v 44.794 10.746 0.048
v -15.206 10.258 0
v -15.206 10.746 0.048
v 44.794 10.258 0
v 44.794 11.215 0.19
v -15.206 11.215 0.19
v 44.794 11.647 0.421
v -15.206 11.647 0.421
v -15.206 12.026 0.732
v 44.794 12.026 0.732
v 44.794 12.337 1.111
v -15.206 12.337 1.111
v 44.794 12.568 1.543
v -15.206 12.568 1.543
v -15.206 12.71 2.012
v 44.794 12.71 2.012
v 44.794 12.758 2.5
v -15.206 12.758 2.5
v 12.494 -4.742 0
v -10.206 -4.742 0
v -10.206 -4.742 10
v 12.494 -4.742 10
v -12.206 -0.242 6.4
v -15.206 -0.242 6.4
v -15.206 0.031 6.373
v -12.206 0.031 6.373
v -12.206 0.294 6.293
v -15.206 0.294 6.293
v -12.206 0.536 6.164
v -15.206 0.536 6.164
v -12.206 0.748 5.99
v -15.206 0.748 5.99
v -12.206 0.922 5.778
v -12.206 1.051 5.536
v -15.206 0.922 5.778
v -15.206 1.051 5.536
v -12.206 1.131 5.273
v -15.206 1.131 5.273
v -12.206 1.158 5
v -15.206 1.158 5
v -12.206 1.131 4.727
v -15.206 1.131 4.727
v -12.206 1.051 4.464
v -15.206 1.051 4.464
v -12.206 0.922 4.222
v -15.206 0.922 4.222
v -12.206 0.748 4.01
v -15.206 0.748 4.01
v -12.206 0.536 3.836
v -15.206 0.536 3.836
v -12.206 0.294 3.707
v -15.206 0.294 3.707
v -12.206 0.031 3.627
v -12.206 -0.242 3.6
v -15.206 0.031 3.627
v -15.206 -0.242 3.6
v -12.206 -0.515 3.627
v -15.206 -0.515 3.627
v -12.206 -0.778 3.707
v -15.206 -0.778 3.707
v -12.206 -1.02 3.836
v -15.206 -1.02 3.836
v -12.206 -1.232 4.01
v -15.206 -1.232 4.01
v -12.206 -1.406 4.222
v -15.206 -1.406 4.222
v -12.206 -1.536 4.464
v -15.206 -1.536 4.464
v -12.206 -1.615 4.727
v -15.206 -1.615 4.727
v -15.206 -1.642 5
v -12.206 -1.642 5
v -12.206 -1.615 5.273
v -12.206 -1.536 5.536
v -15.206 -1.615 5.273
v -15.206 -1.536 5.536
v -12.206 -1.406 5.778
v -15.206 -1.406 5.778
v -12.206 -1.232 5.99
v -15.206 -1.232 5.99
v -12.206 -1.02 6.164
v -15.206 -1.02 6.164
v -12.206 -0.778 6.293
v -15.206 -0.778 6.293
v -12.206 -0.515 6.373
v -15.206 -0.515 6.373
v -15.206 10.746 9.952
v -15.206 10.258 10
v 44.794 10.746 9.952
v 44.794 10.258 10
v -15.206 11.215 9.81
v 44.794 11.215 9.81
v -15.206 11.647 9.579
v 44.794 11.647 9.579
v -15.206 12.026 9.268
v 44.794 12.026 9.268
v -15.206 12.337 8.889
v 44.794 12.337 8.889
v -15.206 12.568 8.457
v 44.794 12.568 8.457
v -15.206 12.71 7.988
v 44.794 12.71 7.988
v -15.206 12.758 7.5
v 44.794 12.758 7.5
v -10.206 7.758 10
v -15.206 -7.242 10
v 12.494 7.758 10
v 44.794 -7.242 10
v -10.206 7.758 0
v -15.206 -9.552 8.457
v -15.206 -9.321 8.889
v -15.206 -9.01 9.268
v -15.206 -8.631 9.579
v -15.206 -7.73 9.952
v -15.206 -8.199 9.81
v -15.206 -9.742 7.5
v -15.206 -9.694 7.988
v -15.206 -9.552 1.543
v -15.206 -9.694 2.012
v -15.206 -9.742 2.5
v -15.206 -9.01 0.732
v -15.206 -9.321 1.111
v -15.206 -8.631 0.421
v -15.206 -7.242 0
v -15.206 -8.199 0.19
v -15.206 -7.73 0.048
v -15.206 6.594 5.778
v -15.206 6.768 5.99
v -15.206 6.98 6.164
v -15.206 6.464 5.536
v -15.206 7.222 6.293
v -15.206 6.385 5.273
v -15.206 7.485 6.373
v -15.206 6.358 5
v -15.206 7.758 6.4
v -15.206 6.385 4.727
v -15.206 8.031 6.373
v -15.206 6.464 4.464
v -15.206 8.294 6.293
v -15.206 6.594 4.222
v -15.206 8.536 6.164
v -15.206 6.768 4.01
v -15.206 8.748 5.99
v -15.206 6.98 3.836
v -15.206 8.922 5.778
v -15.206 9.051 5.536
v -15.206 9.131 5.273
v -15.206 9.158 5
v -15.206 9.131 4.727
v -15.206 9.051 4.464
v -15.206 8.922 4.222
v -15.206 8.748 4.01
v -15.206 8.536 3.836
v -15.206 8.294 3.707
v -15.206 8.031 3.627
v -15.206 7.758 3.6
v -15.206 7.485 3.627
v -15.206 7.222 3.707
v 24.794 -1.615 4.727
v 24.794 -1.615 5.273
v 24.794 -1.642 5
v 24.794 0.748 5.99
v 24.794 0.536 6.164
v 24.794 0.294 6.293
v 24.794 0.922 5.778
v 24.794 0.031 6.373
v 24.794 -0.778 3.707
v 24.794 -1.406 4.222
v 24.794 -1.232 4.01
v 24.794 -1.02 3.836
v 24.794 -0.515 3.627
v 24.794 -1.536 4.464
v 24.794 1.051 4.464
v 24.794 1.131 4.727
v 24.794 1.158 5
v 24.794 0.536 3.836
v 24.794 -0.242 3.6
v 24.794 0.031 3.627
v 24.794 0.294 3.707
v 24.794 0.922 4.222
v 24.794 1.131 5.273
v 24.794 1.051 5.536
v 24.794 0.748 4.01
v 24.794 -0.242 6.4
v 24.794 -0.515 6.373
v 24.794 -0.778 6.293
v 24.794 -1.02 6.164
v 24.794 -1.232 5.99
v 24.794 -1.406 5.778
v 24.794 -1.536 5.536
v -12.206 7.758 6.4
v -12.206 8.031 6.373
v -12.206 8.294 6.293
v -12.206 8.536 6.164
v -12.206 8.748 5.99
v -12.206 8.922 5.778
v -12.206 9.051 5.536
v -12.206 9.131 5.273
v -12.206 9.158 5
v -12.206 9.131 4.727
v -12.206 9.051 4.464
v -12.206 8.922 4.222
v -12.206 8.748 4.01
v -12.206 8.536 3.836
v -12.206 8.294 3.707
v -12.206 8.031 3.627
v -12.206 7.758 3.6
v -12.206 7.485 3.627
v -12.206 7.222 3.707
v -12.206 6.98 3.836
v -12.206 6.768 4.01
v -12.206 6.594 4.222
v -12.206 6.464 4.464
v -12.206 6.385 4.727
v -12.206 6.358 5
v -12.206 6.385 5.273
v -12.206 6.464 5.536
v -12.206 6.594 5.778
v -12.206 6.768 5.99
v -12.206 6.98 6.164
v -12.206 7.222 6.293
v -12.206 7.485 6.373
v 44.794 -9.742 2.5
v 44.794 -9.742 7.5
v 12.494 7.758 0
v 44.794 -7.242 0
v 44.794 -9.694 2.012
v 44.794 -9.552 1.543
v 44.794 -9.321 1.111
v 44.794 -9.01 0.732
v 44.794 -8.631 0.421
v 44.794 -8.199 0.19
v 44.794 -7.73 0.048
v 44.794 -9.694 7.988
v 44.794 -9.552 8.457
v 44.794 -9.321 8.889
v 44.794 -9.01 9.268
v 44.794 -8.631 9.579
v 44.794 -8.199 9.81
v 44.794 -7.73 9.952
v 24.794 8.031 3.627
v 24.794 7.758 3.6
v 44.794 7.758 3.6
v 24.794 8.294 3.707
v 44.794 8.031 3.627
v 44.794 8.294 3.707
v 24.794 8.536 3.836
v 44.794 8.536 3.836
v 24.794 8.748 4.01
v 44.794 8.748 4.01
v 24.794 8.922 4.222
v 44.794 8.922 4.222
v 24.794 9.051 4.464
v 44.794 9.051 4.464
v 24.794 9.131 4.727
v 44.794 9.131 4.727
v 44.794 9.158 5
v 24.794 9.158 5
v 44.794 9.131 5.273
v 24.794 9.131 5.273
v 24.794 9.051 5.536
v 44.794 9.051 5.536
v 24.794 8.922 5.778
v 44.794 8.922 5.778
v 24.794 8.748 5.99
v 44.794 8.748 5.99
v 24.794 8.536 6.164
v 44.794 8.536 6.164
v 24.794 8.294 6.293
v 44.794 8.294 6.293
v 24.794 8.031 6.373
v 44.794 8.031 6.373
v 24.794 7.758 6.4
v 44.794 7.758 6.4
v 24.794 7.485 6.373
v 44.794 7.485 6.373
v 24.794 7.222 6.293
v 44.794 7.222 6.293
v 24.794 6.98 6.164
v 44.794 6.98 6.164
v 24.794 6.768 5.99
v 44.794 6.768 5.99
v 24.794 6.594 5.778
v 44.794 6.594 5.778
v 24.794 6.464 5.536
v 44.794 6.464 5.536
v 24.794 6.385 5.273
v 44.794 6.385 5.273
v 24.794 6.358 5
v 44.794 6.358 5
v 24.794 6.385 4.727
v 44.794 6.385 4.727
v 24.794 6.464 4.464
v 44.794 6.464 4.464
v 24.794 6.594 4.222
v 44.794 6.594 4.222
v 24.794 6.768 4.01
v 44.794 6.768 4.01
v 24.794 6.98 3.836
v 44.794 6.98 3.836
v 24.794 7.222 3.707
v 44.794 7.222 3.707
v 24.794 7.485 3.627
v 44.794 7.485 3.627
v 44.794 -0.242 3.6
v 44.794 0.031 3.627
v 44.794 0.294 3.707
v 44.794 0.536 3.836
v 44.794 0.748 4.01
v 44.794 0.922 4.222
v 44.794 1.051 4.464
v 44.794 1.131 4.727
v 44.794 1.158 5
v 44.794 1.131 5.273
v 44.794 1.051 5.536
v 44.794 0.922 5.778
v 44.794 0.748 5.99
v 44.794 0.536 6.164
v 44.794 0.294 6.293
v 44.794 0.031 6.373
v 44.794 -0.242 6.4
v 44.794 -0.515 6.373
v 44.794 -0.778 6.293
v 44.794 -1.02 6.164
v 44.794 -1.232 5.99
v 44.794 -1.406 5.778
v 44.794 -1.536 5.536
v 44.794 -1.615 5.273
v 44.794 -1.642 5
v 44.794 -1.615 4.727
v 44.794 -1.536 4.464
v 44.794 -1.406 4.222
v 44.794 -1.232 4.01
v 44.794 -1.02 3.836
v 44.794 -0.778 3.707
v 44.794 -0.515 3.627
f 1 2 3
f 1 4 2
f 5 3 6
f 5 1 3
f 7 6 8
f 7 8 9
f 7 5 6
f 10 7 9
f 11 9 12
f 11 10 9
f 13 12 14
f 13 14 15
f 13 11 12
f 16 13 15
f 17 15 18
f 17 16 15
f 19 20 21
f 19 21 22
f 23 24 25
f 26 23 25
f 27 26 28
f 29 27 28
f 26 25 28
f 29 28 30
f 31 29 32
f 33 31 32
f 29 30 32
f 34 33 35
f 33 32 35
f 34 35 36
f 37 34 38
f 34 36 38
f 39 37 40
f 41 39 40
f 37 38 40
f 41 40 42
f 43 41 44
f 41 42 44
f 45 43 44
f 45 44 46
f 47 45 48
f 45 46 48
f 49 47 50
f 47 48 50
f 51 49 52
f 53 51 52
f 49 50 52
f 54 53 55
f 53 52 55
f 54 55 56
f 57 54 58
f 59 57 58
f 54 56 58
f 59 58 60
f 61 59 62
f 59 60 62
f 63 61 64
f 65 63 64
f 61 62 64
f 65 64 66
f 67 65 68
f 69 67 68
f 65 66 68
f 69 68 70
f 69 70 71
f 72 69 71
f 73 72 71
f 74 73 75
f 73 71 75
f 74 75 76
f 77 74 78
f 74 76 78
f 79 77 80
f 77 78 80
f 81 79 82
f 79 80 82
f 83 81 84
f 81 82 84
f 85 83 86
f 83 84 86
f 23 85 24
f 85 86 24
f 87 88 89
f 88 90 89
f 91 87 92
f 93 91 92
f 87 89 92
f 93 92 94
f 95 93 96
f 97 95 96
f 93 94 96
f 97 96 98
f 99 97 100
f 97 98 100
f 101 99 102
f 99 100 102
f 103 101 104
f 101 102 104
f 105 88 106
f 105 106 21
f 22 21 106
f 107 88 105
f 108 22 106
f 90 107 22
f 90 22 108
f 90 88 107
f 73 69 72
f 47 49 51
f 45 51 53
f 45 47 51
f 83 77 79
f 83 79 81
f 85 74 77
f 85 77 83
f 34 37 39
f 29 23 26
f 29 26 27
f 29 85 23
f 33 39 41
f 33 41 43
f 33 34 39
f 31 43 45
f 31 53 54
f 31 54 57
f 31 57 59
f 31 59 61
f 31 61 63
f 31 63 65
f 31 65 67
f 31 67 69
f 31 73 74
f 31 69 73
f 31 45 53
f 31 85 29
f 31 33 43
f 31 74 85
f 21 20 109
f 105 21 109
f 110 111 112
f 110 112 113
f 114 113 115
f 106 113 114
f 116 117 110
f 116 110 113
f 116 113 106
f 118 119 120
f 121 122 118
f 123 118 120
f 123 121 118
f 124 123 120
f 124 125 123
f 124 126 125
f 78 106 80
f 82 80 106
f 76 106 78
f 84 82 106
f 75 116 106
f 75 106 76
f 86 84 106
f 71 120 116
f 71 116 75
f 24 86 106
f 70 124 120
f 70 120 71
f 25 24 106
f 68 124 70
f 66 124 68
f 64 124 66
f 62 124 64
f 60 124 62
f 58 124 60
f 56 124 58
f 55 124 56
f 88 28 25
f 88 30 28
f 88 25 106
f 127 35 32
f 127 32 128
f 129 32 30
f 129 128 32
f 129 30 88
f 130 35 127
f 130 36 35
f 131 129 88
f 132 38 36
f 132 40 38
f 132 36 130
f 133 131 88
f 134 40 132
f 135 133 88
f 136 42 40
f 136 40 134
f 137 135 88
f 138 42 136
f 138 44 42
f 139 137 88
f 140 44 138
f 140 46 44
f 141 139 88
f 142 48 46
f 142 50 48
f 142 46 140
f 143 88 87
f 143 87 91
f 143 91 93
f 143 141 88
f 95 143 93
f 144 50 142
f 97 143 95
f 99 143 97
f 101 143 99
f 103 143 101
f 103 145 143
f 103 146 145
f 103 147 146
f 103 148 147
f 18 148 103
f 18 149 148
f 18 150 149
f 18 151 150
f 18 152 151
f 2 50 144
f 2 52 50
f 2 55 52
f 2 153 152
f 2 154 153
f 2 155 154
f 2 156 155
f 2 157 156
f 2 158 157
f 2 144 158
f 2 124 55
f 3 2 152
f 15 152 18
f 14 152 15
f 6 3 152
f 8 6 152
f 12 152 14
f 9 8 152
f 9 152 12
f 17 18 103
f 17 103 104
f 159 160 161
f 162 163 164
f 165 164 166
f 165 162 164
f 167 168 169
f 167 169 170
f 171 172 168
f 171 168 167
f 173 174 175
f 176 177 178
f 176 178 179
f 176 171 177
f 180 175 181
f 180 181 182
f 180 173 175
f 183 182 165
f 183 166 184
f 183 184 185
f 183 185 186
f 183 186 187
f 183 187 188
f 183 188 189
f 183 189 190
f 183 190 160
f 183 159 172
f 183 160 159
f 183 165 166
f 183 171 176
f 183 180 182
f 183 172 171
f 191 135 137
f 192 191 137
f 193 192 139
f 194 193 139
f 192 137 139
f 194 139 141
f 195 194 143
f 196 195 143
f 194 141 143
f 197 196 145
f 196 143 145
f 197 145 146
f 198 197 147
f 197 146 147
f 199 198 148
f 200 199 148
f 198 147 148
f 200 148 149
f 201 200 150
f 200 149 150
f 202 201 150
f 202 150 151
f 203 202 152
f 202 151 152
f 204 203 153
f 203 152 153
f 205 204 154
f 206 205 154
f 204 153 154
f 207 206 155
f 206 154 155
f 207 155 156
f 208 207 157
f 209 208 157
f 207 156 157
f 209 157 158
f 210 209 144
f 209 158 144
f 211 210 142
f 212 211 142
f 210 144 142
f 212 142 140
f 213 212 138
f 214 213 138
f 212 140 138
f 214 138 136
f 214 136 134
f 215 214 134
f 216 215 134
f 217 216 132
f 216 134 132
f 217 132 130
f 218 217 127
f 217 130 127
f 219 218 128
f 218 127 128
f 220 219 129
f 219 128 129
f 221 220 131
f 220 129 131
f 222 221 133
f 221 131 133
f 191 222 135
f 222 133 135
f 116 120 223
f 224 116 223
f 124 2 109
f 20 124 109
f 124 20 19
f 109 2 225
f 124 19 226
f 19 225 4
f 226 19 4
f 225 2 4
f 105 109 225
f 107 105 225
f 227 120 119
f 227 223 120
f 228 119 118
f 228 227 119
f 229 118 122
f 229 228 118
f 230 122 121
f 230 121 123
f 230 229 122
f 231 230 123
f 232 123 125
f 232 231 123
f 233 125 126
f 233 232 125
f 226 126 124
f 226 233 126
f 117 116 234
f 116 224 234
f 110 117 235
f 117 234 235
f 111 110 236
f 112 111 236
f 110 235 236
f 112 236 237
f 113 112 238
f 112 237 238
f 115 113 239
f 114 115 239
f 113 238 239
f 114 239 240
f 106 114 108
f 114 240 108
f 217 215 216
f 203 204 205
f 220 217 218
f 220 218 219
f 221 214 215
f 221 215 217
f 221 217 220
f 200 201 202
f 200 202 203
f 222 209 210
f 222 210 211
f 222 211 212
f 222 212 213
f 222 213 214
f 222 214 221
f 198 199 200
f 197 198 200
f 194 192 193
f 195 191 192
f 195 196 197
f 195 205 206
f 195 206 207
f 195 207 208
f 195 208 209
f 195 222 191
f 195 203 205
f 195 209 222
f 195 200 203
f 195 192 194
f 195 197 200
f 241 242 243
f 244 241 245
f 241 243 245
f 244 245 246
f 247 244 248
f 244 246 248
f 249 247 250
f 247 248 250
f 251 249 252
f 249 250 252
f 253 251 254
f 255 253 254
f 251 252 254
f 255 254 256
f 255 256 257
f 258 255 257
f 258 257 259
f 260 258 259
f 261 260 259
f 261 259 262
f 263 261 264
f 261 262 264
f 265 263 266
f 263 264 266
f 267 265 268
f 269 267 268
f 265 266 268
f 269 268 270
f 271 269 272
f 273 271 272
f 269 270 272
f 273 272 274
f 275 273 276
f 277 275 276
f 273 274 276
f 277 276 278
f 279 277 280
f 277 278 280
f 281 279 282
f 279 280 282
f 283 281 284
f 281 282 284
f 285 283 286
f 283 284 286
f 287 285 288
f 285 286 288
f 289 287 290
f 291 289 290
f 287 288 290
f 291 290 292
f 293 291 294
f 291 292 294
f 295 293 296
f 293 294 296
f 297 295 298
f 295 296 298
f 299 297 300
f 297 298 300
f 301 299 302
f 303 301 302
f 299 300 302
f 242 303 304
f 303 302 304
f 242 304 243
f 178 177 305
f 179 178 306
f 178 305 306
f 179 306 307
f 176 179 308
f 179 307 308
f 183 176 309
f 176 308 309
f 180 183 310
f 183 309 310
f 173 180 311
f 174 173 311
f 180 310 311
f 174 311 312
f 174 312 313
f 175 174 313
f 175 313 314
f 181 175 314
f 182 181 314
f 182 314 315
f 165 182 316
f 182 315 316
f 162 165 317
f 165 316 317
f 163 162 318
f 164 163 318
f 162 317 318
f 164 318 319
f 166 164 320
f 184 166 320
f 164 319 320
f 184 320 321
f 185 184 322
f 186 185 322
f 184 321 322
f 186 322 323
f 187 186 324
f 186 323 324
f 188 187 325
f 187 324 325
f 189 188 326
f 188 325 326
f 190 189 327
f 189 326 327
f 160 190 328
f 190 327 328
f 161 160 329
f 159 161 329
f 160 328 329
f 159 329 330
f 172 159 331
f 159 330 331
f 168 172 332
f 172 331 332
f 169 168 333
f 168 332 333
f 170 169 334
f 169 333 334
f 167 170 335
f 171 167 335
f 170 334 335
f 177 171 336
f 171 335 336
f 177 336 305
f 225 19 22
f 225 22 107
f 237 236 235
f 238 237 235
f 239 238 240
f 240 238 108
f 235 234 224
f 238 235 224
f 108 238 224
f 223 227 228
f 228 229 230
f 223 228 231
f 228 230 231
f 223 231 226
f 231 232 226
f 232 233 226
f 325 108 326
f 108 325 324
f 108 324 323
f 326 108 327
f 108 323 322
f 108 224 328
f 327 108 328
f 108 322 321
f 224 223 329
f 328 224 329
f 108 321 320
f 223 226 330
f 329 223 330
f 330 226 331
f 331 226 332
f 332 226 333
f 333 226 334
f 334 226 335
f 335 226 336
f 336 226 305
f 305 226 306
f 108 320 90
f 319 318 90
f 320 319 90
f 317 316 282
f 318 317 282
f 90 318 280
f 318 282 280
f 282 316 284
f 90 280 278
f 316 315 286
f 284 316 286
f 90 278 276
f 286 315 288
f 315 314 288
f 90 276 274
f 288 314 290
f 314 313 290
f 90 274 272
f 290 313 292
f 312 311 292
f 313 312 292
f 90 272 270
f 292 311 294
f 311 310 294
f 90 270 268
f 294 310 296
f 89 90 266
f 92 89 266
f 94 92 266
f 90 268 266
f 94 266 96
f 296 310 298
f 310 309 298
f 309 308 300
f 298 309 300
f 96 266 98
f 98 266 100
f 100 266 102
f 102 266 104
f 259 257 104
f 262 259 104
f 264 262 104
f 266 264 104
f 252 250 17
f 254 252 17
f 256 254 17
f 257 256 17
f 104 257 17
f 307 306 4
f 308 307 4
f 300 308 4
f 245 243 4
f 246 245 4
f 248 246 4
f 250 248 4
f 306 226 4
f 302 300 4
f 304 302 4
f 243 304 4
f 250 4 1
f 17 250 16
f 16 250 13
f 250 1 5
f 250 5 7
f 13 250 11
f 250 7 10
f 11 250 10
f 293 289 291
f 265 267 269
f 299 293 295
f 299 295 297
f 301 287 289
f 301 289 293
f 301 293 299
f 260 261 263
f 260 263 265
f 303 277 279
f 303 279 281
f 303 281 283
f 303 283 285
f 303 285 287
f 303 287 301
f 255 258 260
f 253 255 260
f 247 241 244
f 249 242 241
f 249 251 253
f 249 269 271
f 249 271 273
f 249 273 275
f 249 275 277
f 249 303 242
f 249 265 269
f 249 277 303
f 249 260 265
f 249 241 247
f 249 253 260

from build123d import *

# Parameters (mm, degrees)
ESBO_O1_W                = 60
ESBO_O1_H                = 22.5
ESBO_O1_W_2              = 22.7
ESBO_O1_H_2              = 12.5
RESSALTO_EXTRUS_O1_DEPTH = 10
ESBO_O3_R                = 1.4
CORTE_EXTRUS_O2_DEPTH    = 20
ESBO_O4_R                = 1.4
CORTE_EXTRUS_O3_DEPTH    = 3
FILETE1_R                = 2.5


with BuildPart() as part:
    # Esboço1 → Ressalto-extrusão1 (new body)
    with BuildSketch(Plane.XY):
        with Locations((14.794474124, 1.507916667)):
            Rectangle(ESBO_O1_W, ESBO_O1_H)
        with Locations((1.144474124, 1.507916667)):
            Rectangle(ESBO_O1_W_2, ESBO_O1_H_2, mode=Mode.SUBTRACT)
    extrude(amount=RESSALTO_EXTRUS_O1_DEPTH)

    # Esboço3 → Corte-extrusão2 (cut)
    with BuildSketch(Plane(origin=(44.794474124, 0, 0), x_dir=(0, 0, -1), z_dir=(1, 0, 0))):
        with Locations((-5, 7.757916667)):
            Circle(ESBO_O3_R)
        with Locations((-5, -0.242083333)):
            Circle(ESBO_O3_R)
    extrude(amount=-CORTE_EXTRUS_O2_DEPTH, mode=Mode.SUBTRACT)

    # Esboço4 → Corte-extrusão3 (cut)
    with BuildSketch(Plane.ZY.offset(15.205525876)):
        with Locations((5, 7.757916667)):
            Circle(ESBO_O4_R)
        with Locations((5, -0.242083333)):
            Circle(ESBO_O4_R)
    extrude(amount=-CORTE_EXTRUS_O3_DEPTH, mode=Mode.SUBTRACT)

    # Filete1
    filete1_edges = [part.edges().sort_by_distance(p)[0] for p in [
        (14.794474124, 12.757916667, 10),
        (14.794474124, 12.757916667, 0),
        (14.794474124, -9.742083333, 0),
        (14.794474124, -9.742083333, 10),
    ]]
    fillet(filete1_edges, radius=FILETE1_R)


solid = part.part
